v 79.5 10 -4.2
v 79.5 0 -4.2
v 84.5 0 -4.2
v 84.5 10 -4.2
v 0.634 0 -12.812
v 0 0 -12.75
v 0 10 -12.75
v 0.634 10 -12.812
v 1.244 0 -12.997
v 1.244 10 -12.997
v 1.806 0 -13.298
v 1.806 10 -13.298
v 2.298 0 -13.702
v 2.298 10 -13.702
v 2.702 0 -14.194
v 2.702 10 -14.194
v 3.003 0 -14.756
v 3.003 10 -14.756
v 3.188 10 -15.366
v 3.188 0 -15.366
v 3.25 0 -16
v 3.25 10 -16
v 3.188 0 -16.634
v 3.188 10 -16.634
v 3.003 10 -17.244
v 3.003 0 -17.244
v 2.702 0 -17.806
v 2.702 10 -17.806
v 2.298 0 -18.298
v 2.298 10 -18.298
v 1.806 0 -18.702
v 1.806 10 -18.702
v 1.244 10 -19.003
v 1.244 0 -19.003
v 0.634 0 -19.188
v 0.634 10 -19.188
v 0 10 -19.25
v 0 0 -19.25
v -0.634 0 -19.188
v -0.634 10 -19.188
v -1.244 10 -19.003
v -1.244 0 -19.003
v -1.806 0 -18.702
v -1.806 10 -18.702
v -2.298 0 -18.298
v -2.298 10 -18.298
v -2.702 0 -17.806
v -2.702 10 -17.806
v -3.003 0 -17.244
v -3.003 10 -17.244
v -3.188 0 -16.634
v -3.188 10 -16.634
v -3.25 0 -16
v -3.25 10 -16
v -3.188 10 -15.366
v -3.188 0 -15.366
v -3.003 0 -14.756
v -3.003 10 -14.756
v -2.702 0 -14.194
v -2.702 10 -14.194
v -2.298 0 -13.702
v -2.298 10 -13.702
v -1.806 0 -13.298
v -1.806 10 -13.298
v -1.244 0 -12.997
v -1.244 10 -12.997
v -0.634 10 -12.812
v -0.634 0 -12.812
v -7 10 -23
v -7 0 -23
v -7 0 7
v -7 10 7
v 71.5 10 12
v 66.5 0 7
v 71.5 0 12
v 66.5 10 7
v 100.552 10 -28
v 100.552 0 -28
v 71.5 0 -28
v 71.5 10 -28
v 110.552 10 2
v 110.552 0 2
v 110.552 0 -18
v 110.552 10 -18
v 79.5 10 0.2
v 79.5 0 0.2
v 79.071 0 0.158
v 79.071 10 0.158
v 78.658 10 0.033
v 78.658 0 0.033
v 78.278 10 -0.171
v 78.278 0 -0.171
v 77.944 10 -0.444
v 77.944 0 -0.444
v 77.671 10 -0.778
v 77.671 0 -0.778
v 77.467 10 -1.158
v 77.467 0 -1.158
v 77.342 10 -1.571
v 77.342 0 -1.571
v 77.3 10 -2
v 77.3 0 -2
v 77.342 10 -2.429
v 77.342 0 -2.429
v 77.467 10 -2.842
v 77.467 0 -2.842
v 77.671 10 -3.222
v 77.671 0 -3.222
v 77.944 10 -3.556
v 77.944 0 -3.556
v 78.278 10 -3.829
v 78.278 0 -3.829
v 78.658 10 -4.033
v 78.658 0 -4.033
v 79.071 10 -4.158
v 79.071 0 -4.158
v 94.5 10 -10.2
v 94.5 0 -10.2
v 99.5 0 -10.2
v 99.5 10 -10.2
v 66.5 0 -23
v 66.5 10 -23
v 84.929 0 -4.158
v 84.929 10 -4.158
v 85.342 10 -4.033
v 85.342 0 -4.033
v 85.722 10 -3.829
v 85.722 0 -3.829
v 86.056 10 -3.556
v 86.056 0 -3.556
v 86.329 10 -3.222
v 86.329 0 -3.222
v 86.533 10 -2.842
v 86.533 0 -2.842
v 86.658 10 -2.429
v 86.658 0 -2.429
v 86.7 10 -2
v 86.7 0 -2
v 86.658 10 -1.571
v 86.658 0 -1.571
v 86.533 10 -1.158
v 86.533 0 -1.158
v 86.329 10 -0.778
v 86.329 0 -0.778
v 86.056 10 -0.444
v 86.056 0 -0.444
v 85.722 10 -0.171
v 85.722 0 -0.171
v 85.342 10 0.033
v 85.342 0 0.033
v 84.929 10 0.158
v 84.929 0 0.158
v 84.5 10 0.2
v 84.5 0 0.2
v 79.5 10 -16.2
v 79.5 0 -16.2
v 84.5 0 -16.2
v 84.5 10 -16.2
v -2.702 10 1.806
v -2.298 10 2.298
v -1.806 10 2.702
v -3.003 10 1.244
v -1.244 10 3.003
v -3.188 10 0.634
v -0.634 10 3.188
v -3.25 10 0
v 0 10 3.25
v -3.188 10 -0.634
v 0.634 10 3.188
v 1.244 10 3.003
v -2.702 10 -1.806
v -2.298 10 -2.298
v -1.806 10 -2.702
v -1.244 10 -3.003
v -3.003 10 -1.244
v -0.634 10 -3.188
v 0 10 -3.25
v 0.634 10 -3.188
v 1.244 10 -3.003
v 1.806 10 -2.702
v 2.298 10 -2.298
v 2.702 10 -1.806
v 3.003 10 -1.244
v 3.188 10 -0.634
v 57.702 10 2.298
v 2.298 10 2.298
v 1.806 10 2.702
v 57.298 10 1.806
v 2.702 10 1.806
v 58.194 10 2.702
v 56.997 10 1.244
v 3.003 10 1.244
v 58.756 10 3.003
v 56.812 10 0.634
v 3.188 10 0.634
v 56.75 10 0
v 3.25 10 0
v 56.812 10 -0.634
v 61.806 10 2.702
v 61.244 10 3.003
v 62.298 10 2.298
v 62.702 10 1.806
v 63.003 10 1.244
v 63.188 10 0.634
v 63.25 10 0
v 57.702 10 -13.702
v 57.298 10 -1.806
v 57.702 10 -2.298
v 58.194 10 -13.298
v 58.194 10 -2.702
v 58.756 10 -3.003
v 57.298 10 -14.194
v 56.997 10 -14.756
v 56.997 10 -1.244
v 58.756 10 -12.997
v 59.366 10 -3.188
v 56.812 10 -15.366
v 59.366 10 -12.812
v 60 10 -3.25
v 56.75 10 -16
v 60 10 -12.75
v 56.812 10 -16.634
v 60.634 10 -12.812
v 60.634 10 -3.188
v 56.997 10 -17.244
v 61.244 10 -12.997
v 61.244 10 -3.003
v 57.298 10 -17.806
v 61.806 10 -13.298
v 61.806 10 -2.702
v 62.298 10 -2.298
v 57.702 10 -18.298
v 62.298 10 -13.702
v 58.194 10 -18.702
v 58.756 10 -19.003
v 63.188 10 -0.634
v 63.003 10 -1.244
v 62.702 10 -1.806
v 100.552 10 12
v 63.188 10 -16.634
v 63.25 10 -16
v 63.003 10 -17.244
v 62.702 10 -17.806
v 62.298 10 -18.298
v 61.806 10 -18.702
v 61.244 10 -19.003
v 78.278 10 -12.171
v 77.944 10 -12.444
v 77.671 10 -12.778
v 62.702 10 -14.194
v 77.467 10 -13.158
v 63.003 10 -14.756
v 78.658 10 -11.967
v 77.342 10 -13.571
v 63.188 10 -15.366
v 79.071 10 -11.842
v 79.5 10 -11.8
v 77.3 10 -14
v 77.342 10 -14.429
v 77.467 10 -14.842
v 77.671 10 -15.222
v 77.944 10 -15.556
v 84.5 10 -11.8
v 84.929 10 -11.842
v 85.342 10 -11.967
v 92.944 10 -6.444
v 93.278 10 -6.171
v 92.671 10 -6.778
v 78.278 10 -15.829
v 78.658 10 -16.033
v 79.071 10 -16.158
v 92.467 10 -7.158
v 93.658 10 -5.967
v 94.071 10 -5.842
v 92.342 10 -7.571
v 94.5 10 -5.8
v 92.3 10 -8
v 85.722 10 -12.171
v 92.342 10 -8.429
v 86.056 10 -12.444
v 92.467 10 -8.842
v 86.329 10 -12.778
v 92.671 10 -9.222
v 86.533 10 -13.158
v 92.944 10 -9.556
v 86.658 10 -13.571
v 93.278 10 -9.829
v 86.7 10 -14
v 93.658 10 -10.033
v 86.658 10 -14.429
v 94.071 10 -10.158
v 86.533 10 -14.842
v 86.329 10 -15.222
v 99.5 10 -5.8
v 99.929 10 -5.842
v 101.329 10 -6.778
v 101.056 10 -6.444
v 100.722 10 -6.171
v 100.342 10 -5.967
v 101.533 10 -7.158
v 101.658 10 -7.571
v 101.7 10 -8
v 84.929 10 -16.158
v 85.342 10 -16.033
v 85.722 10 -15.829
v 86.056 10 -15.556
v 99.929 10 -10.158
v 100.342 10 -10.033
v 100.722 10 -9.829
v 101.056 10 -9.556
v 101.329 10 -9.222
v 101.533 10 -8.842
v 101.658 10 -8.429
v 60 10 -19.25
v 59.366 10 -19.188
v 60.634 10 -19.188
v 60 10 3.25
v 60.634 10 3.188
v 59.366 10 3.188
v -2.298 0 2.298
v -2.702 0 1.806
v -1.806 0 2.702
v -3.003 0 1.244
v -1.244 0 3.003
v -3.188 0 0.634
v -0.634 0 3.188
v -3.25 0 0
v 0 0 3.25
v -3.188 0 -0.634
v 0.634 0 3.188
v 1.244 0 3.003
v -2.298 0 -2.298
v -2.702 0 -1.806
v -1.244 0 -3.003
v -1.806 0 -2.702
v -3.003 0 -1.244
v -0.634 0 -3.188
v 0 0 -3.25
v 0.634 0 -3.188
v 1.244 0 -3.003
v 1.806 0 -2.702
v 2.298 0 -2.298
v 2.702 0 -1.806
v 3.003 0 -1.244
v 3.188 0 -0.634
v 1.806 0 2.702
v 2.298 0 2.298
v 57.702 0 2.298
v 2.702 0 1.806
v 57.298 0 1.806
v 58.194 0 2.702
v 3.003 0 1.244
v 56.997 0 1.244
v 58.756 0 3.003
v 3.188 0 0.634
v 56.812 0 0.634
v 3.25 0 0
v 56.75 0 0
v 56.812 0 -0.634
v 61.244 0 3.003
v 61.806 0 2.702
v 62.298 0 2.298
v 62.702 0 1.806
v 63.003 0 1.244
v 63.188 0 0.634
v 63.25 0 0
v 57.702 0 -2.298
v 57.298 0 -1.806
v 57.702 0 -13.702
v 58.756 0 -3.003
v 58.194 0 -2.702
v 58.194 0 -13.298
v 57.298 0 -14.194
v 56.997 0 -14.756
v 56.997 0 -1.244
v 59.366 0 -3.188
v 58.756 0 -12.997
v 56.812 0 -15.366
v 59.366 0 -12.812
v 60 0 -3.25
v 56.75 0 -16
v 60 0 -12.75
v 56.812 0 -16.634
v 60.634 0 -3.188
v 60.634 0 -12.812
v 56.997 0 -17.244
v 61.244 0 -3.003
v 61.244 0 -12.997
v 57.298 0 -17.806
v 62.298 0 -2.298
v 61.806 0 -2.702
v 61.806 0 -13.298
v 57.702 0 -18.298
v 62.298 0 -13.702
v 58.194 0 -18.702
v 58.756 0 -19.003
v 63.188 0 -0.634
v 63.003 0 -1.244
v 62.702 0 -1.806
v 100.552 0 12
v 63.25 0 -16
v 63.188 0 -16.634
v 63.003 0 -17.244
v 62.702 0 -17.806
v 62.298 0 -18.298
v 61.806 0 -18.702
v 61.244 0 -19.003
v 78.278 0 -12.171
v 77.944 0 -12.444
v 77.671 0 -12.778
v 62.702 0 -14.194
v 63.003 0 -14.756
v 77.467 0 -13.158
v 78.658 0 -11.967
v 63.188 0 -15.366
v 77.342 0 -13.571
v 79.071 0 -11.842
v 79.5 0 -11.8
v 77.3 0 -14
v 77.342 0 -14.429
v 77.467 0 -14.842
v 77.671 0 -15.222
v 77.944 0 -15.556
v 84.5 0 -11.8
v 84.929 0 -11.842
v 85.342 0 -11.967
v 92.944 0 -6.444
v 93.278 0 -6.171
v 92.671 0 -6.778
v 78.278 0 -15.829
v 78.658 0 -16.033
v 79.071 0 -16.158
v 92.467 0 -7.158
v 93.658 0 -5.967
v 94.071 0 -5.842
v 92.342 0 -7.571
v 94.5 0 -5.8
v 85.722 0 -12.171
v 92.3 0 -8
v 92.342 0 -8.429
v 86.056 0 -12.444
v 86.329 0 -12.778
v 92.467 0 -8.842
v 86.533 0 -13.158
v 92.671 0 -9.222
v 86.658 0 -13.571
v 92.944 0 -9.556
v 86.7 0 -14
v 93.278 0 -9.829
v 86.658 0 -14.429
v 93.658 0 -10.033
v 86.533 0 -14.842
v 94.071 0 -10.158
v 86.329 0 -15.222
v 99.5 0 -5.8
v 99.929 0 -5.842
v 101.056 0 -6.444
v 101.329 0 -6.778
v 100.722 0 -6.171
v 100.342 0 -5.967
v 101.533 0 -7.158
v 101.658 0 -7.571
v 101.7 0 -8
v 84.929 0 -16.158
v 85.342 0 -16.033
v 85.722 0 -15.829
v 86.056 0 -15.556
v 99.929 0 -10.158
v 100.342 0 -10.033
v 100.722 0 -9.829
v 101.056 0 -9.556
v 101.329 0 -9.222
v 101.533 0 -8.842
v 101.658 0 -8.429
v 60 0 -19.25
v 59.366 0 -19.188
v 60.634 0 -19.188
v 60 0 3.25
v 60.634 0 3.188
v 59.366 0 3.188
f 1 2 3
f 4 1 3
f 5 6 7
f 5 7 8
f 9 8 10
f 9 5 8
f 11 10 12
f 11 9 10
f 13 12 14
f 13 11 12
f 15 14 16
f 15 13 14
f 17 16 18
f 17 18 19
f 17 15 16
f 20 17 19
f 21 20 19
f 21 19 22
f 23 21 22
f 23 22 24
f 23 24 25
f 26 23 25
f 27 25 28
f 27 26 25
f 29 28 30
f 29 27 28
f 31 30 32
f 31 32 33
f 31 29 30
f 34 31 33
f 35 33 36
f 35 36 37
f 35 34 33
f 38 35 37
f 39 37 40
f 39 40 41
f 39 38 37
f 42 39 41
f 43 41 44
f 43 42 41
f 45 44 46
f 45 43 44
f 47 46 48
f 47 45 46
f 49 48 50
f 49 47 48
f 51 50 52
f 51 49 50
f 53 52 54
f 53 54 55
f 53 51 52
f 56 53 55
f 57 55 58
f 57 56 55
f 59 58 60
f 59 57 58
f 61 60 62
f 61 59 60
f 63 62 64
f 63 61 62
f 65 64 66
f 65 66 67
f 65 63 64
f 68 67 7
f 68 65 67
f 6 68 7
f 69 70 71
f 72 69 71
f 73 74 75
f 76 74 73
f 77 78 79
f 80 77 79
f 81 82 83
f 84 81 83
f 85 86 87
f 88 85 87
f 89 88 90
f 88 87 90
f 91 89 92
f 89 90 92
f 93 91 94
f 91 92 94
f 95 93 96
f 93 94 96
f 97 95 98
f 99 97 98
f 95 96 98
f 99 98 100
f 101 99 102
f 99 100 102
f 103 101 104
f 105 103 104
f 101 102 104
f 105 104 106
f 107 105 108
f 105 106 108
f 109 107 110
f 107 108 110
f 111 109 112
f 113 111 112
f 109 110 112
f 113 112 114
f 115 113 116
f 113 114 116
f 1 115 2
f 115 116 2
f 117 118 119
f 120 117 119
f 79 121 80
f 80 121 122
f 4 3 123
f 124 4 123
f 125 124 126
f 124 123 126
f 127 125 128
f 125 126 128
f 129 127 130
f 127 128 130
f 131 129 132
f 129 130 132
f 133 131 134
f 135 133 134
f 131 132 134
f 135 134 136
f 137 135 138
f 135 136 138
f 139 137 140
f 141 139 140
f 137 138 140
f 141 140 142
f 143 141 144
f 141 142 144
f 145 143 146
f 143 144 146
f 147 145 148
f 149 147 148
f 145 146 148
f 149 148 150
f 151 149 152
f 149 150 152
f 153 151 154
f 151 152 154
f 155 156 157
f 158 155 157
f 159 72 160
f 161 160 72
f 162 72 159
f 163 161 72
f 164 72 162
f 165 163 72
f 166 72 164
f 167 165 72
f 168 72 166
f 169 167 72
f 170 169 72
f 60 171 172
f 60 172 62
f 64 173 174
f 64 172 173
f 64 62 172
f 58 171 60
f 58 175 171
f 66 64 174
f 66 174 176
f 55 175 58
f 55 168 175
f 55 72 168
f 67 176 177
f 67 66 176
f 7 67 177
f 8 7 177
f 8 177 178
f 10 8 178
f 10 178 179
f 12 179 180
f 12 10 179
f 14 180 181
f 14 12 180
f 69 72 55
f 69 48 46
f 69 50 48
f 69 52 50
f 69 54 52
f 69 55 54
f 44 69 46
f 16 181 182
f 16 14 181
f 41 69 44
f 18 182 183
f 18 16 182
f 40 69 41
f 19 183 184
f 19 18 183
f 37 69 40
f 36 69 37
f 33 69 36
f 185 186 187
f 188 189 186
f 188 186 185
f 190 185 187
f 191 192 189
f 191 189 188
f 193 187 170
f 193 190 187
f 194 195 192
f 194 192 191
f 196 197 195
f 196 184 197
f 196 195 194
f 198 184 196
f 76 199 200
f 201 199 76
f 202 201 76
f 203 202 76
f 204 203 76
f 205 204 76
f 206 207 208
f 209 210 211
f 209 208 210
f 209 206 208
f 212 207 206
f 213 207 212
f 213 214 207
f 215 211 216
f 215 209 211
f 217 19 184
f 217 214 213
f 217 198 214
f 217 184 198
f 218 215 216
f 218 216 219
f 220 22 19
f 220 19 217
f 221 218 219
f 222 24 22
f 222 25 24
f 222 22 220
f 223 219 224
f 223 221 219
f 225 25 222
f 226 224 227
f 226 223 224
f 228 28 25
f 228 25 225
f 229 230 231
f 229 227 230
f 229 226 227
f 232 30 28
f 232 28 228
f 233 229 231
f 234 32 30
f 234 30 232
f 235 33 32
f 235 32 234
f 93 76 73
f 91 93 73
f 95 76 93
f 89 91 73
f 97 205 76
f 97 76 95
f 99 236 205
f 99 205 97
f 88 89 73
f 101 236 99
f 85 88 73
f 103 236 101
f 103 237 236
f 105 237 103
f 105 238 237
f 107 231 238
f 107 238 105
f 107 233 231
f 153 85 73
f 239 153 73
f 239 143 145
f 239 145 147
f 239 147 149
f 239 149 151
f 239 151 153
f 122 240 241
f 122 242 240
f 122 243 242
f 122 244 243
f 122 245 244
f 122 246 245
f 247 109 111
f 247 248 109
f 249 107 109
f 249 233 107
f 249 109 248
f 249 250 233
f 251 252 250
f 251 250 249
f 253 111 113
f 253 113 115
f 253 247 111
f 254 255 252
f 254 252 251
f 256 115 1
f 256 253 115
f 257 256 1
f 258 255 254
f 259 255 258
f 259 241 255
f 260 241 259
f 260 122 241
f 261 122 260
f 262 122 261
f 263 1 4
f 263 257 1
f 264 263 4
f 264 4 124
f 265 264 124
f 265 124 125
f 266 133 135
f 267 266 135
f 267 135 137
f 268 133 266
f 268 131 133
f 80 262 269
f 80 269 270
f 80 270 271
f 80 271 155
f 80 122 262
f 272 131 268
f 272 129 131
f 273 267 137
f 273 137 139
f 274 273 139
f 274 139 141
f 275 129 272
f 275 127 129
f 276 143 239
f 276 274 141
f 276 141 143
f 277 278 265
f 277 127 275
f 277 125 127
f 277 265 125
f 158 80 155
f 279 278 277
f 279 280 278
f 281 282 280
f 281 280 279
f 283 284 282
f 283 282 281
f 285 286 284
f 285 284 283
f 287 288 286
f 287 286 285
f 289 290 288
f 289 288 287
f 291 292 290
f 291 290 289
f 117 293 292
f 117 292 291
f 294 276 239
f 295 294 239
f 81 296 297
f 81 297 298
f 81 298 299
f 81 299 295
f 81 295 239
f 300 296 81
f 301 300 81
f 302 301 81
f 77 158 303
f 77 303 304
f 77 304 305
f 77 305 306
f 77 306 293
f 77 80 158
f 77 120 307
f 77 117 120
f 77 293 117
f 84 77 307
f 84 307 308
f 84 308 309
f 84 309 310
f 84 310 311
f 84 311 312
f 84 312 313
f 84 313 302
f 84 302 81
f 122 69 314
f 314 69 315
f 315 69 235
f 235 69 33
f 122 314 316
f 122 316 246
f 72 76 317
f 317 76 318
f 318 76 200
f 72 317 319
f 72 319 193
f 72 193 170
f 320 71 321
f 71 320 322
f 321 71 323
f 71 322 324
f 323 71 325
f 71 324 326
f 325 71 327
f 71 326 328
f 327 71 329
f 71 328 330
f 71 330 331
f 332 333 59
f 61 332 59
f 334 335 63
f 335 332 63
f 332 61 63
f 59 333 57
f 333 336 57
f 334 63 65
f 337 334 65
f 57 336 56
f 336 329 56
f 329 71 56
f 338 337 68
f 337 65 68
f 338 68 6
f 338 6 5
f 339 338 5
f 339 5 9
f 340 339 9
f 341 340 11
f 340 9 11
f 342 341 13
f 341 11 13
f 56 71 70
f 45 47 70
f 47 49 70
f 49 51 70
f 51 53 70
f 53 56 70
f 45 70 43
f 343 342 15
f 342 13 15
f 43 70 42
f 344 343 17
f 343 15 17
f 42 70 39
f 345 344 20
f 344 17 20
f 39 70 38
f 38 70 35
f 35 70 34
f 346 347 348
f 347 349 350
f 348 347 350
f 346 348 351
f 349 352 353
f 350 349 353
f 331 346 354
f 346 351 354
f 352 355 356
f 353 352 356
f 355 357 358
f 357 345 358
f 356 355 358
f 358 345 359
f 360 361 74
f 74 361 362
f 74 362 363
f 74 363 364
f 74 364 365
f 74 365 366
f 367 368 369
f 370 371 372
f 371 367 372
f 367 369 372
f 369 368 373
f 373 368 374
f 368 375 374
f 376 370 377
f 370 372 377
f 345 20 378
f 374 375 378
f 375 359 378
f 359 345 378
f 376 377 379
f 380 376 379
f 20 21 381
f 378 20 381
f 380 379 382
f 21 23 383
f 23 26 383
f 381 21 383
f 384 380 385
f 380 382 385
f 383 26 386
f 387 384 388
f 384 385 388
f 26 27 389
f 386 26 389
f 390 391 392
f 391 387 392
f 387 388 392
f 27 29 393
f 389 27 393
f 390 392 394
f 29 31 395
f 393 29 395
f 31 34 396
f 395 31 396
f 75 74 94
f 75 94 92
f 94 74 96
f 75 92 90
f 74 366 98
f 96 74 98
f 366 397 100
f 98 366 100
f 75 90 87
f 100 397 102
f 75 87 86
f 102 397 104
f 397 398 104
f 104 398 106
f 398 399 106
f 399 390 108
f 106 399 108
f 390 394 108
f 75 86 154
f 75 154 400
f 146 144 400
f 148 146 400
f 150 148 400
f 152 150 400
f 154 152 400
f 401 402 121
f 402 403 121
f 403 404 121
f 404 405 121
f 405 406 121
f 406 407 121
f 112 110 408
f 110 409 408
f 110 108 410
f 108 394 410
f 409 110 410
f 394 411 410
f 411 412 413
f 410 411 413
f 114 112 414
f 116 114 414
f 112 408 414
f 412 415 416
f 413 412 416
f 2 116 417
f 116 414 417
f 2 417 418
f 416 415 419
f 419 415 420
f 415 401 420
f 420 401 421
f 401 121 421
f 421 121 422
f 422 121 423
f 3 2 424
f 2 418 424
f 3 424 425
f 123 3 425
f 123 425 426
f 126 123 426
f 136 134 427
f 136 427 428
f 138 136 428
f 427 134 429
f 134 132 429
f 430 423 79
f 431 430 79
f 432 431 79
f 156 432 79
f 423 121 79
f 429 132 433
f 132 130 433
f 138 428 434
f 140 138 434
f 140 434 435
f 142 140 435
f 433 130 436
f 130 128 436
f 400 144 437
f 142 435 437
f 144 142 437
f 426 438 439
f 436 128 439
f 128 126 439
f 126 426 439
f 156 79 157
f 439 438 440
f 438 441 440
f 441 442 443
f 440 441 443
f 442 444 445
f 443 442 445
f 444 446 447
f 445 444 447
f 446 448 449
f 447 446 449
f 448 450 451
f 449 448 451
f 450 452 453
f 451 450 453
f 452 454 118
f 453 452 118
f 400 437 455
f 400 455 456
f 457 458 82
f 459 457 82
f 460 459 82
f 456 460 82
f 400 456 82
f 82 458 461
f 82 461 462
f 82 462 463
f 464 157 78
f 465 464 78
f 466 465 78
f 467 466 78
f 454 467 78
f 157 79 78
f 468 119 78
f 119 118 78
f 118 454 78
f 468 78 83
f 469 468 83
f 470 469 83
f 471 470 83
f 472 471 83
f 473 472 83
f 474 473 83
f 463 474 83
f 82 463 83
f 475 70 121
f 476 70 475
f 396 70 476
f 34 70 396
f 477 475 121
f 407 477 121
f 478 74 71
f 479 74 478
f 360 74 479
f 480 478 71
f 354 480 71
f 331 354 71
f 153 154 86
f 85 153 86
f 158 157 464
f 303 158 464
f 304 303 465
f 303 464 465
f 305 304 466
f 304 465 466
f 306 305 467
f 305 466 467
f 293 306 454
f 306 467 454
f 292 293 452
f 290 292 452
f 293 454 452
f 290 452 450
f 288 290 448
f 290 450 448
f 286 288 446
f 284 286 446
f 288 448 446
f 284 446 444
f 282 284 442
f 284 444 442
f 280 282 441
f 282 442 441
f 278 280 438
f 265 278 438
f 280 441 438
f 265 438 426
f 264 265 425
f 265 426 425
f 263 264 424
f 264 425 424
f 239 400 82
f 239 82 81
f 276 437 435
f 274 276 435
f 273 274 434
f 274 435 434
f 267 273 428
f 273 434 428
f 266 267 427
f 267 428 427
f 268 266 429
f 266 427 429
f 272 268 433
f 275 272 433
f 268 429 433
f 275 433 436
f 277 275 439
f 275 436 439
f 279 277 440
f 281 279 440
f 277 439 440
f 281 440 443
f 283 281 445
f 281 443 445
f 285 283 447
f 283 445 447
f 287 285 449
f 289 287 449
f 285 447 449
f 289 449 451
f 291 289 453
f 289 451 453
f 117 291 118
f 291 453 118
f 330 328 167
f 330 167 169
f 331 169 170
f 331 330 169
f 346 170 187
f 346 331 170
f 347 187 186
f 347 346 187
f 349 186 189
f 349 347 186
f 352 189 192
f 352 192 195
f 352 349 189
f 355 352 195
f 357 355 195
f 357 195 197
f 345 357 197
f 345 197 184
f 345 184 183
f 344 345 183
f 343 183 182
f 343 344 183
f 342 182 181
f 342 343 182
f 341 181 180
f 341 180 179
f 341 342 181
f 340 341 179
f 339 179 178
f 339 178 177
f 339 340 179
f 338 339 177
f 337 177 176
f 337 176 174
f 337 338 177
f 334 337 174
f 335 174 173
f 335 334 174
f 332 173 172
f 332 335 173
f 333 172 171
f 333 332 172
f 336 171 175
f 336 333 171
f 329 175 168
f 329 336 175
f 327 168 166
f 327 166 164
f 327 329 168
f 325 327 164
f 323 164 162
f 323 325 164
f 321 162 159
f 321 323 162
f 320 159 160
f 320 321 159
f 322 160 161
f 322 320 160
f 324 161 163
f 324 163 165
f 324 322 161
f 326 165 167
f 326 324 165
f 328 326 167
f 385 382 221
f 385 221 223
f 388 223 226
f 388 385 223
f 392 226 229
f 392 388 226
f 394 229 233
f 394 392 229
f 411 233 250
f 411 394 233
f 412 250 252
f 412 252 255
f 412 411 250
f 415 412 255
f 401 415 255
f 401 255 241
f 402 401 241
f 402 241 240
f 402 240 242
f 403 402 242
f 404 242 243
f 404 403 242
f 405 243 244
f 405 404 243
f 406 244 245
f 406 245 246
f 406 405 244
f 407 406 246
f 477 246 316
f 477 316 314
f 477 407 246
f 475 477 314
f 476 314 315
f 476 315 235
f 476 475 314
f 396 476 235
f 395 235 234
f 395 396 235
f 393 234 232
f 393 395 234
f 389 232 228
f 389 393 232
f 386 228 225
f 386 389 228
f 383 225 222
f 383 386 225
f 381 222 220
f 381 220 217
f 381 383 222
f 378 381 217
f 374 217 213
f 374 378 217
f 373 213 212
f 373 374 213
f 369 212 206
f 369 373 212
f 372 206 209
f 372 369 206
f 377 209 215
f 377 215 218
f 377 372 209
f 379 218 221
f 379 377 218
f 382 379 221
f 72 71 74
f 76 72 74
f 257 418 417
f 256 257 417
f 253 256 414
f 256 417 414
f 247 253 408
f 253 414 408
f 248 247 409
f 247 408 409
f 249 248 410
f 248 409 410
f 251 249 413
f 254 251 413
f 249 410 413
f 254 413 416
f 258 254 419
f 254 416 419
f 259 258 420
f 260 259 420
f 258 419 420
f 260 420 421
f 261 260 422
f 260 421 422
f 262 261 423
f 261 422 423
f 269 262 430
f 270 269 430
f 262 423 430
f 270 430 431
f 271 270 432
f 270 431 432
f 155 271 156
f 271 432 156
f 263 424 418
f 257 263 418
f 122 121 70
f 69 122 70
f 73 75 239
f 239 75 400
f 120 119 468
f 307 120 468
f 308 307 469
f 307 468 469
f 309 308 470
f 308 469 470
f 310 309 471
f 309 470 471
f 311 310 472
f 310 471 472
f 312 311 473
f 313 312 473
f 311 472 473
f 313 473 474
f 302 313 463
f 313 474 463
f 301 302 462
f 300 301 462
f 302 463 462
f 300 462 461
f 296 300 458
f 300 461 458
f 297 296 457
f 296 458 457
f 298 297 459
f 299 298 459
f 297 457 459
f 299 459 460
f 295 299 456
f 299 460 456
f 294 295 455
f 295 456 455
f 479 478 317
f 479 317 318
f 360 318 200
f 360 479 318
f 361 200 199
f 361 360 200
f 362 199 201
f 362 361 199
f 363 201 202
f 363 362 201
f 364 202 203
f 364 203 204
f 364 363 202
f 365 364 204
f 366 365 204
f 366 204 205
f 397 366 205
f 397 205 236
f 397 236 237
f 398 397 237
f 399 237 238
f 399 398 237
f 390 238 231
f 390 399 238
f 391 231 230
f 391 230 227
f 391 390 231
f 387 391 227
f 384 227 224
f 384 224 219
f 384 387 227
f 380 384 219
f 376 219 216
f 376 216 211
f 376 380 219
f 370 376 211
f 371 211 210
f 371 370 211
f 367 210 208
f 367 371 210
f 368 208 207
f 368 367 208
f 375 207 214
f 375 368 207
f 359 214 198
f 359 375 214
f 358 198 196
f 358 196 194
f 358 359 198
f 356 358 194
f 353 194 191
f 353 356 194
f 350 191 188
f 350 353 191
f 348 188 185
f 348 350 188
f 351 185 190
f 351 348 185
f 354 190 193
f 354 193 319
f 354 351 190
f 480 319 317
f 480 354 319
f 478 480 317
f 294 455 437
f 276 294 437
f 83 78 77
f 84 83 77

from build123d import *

# Parameters (mm, degrees)
SKETCH1_R           = 3.25
BOSS_EXTRUDE1_DEPTH = 10
CHAMFER1_SIZE       = 10
CHAMFER2_SIZE       = 5


with BuildPart() as part:
    # Sketch1 → Boss-Extrude1 (new body)
    with BuildSketch(Plane(origin=(0, 0, 0), x_dir=(1, 0, 0), z_dir=(0, 1, 0))):
        Polygon((-7, 23), (-7, -7), (66.5, -7), (66.5, -12), (110.55184454, -12), (110.55184454, 28), (66.5, 28), (66.5, 23), align=None)
        with Locations(Location((0, 0, 0), (0, 0, 270))):
            Circle(SKETCH1_R, mode=Mode.SUBTRACT)
        with Locations(Location((0, 16, 0), (0, 0, 270))):
            Circle(SKETCH1_R, mode=Mode.SUBTRACT)
        with Locations(Location((60, 0, 0), (0, 0, 270))):
            Circle(SKETCH1_R, mode=Mode.SUBTRACT)
        with Locations(Location((60, 16, 0), (0, 0, 270))):
            Circle(SKETCH1_R, mode=Mode.SUBTRACT)
        with BuildLine():
            Line((99.5, 5.8), (94.5, 5.8))
            ThreePointArc((94.5, 5.8), (92.3, 8), (94.5, 10.2))
            Line((94.5, 10.2), (99.5, 10.2))
            ThreePointArc((99.5, 10.2), (101.7, 8), (99.5, 5.8))
        make_face(mode=Mode.SUBTRACT)
        with BuildLine():
            Line((84.5, 11.8), (79.5, 11.8))
            ThreePointArc((79.5, 11.8), (77.3, 14), (79.5, 16.2))
            Line((79.5, 16.2), (84.5, 16.2))
            ThreePointArc((84.5, 16.2), (86.7, 14), (84.5, 11.8))
        make_face(mode=Mode.SUBTRACT)
        with BuildLine():
            Line((84.5, -0.2), (79.5, -0.2))
            ThreePointArc((79.5, -0.2), (77.3, 2), (79.5, 4.2))
            Line((79.5, 4.2), (84.5, 4.2))
            ThreePointArc((84.5, 4.2), (86.7, 2), (84.5, -0.2))
        make_face(mode=Mode.SUBTRACT)
    extrude(amount=BOSS_EXTRUDE1_DEPTH)

    # Chamfer1
    chamfer1_edges = [part.edges().sort_by_distance(p)[0] for p in [
        (110.55184454, 5, -28),
        (110.55184454, 5, 12),
    ]]
    chamfer(chamfer1_edges, length=CHAMFER1_SIZE)

    # Chamfer2
    chamfer2_edges = [part.edges().sort_by_distance(p)[0] for p in [
        (66.5, 5, 12),
        (66.5, 5, -28),
    ]]
    chamfer(chamfer2_edges, length=CHAMFER2_SIZE - 0.0001)  # a hair under: the kernel refuses the full size


solid = part.part
